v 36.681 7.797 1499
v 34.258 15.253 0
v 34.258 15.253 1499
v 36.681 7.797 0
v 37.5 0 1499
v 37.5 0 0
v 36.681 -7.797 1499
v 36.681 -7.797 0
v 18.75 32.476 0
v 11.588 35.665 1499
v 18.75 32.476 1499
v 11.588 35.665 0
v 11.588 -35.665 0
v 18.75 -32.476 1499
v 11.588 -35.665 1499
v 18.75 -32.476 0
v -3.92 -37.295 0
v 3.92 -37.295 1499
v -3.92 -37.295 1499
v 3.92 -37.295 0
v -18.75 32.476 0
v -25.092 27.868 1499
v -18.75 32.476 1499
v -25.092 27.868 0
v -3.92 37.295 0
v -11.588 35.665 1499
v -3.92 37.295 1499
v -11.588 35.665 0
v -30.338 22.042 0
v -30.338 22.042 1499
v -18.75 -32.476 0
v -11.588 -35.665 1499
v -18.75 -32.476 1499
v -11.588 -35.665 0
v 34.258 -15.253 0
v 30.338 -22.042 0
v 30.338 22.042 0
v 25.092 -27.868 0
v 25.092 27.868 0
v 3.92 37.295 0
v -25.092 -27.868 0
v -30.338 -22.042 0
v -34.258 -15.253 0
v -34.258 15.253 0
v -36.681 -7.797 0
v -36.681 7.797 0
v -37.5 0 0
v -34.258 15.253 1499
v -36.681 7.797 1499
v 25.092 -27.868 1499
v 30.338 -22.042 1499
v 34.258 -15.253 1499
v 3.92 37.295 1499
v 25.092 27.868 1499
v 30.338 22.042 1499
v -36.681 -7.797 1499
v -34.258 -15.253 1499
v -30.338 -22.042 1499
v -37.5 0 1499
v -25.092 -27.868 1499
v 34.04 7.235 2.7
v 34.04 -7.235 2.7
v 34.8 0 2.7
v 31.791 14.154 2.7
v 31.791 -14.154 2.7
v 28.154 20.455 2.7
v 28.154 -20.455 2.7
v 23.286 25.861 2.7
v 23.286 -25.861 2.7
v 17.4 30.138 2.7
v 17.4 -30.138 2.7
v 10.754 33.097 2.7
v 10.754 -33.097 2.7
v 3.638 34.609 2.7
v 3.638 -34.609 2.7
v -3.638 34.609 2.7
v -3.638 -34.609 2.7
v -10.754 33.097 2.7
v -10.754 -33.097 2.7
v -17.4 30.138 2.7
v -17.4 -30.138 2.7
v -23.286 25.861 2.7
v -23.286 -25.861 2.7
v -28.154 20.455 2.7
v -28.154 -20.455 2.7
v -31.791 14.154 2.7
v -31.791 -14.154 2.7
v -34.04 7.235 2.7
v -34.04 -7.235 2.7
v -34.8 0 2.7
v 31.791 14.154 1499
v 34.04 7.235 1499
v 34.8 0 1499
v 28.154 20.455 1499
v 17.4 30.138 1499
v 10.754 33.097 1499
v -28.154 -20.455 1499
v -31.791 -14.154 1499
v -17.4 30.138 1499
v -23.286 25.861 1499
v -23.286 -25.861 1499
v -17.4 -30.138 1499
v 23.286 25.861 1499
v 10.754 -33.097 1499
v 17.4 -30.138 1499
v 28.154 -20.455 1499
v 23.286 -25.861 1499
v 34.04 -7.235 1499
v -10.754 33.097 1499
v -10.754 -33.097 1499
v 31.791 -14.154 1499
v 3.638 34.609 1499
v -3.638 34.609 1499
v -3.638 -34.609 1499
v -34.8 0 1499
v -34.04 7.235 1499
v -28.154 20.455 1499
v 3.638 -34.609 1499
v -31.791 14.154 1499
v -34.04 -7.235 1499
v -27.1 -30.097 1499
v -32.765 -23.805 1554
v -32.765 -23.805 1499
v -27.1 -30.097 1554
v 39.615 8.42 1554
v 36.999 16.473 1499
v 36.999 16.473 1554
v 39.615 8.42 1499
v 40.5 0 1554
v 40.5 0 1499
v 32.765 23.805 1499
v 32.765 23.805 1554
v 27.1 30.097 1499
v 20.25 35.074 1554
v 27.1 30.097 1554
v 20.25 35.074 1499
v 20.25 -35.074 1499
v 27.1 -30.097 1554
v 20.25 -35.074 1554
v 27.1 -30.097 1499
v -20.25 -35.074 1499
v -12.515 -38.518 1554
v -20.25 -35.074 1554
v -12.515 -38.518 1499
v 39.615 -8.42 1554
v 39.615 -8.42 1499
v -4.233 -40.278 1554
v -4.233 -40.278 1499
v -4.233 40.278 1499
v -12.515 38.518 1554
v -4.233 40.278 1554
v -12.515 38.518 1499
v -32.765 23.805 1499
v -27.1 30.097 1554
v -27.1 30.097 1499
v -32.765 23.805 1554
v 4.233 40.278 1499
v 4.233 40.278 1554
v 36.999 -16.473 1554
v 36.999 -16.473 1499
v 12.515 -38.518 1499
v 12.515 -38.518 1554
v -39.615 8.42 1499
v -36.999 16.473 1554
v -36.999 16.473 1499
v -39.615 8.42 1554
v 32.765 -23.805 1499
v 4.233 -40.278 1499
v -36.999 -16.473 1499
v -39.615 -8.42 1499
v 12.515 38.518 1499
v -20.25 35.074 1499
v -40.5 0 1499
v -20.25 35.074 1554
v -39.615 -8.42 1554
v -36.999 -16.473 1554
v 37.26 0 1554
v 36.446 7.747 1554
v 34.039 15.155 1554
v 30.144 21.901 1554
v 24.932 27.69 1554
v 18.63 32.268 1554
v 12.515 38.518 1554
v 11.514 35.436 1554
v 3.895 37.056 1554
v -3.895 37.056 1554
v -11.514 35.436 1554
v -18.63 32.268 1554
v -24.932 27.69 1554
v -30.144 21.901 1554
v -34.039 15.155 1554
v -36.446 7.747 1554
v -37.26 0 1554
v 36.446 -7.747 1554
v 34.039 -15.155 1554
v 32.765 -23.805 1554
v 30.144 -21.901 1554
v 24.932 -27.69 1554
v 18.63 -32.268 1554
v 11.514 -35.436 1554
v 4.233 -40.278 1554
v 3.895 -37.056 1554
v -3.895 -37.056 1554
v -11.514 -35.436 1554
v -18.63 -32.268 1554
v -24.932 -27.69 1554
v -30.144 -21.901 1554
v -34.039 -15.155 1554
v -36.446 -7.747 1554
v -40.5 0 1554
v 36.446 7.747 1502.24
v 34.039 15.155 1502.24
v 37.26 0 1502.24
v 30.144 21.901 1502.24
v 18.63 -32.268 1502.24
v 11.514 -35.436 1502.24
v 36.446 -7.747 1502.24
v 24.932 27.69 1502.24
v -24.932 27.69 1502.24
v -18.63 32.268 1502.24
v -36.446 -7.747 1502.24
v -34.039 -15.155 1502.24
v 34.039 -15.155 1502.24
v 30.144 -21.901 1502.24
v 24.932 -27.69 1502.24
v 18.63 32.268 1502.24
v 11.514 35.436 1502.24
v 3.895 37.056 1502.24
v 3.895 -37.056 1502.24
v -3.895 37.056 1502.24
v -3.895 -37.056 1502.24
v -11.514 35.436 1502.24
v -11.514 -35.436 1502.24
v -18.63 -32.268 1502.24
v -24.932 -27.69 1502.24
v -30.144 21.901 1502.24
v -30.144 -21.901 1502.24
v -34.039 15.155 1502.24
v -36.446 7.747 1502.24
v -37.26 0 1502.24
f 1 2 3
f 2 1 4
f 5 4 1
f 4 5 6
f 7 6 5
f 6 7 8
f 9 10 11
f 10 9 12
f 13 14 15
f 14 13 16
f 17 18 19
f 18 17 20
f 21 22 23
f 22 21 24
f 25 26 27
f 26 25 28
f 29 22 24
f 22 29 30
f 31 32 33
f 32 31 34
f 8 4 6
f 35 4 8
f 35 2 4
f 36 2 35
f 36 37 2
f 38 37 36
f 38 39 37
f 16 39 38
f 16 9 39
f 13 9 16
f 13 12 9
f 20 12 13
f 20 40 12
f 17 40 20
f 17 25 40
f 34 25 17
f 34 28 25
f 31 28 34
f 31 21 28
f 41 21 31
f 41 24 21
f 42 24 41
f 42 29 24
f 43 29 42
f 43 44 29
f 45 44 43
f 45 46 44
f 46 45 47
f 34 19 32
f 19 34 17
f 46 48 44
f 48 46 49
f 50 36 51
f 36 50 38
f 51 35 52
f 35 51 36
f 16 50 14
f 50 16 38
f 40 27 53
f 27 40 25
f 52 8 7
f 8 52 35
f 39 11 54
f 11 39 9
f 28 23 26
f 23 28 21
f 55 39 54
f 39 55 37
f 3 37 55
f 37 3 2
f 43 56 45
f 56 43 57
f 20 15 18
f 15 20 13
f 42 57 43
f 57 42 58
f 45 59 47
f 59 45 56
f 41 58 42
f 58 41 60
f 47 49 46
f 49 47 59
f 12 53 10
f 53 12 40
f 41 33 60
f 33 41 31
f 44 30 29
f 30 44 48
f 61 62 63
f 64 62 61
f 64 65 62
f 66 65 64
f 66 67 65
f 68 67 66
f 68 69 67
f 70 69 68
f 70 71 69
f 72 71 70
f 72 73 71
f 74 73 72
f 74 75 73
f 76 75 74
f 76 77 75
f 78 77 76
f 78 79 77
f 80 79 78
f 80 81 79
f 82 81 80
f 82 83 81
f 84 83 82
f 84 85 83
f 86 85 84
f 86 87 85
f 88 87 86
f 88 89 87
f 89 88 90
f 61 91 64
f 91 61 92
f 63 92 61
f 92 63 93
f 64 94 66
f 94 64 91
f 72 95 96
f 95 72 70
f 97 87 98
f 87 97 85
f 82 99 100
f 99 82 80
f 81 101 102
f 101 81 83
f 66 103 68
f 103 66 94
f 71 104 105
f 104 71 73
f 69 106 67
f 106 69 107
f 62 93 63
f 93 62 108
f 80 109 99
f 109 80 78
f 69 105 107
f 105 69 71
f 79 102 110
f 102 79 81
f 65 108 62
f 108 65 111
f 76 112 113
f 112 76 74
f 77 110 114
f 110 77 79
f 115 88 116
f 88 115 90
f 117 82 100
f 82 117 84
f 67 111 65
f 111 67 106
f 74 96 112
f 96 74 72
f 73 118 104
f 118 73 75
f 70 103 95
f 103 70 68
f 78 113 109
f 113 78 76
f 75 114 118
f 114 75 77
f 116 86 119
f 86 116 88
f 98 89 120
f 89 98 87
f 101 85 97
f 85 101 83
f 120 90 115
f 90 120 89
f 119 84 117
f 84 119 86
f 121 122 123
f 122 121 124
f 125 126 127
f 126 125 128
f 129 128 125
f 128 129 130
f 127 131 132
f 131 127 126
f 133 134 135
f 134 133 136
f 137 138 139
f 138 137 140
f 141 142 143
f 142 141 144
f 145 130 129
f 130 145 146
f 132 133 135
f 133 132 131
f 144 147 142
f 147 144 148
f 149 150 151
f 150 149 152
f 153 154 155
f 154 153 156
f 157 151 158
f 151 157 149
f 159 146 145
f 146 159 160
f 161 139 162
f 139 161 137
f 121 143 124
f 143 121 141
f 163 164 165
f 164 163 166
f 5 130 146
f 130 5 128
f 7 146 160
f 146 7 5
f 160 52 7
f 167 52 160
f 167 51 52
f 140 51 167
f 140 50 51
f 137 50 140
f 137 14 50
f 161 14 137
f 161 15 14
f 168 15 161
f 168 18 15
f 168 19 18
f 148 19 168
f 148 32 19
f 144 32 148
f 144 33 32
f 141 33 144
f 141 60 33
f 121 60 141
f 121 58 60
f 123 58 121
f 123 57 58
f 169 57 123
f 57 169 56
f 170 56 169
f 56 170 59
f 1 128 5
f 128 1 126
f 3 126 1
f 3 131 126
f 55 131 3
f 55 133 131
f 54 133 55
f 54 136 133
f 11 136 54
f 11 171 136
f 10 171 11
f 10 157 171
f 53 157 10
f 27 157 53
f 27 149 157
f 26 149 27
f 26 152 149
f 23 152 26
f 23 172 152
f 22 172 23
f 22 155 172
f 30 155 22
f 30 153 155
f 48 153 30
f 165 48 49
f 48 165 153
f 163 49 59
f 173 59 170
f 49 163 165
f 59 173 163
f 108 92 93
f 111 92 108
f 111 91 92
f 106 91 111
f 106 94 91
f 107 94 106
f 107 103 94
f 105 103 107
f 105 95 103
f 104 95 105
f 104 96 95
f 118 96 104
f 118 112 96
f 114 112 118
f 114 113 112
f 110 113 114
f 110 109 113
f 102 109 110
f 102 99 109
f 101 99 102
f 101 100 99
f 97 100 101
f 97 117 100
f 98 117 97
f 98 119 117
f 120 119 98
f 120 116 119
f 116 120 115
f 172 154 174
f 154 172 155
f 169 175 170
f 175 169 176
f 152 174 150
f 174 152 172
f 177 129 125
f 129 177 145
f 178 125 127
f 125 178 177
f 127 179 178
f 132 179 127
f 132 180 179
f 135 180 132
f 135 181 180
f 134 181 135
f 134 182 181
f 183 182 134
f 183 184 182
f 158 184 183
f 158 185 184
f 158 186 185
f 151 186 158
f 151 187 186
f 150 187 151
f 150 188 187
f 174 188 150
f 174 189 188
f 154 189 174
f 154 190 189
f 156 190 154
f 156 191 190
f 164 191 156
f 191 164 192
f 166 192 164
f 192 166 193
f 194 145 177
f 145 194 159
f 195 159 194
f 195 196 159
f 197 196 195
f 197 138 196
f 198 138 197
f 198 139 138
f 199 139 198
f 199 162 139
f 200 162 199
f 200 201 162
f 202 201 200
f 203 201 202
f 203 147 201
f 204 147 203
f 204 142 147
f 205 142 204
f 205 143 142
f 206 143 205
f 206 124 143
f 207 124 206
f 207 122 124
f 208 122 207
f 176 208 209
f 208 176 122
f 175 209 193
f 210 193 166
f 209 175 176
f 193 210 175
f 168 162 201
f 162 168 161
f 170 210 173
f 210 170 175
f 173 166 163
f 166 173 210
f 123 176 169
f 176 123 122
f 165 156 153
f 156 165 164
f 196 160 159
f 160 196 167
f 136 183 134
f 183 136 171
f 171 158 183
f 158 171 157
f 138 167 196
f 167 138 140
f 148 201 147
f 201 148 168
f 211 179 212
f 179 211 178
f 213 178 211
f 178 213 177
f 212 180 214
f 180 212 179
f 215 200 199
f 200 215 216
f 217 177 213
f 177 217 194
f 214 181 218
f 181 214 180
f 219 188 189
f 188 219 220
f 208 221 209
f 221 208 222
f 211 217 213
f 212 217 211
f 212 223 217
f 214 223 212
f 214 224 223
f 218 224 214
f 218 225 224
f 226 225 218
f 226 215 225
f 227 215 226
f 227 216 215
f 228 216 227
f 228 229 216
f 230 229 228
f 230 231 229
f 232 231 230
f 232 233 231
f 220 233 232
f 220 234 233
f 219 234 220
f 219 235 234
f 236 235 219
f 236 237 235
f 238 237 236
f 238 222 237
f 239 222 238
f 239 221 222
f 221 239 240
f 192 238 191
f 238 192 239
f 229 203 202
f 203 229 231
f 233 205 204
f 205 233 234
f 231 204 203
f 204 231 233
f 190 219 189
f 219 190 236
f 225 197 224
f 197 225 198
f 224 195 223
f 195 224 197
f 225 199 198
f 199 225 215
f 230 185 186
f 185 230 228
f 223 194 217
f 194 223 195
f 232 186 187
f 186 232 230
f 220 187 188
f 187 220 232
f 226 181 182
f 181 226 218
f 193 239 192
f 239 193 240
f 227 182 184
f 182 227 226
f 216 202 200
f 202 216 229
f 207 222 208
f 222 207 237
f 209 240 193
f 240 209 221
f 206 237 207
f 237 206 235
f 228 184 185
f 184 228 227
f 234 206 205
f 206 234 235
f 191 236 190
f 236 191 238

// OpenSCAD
// Parameters
length_mm = 1500; //[750:3000:10]
ht75_outer_diameter_mm = 75; //[60:90:1]
ht75_wall_thickness_mm = 2.7; //[1.5:5.4:0.1]
end_fitting_length_mm = 55; //[30:110:1]
end_fitting_od_scale = 1.08; //[1.02:1.2:0.01]
end_fitting_wall_scale = 1.2; //[1.0:2.0:0.05]
connection_overlap_mm = 1; //[0.5:2:0.1]

// HT Pipe - complete geometry
module ht_pipe() {
  color([0.85, 0.85, 0.8]) { // PVC color
    // Pipe body
    difference() {
      cylinder(h=length_mm, r=ht75_outer_diameter_mm/2, center=false);
      translate([0, 0, ht75_wall_thickness_mm])
        cylinder(h=length_mm, r=ht75_outer_diameter_mm/2 - ht75_wall_thickness_mm, center=false);
    }
    
    // End fitting
    difference() {
      translate([0, 0, length_mm - connection_overlap_mm])
        cylinder(h=end_fitting_length_mm, r=(ht75_outer_diameter_mm * end_fitting_od_scale) / 2, center=false);
      translate([0, 0, length_mm - connection_overlap_mm + (ht75_wall_thickness_mm * end_fitting_wall_scale)])
        cylinder(h=end_fitting_length_mm, r=(ht75_outer_diameter_mm * end_fitting_od_scale) / 2 - (ht75_wall_thickness_mm * end_fitting_wall_scale), center=false);
    }
  }
}

// Assembly
module assembly() {
  ht_pipe();
}

assembly();
